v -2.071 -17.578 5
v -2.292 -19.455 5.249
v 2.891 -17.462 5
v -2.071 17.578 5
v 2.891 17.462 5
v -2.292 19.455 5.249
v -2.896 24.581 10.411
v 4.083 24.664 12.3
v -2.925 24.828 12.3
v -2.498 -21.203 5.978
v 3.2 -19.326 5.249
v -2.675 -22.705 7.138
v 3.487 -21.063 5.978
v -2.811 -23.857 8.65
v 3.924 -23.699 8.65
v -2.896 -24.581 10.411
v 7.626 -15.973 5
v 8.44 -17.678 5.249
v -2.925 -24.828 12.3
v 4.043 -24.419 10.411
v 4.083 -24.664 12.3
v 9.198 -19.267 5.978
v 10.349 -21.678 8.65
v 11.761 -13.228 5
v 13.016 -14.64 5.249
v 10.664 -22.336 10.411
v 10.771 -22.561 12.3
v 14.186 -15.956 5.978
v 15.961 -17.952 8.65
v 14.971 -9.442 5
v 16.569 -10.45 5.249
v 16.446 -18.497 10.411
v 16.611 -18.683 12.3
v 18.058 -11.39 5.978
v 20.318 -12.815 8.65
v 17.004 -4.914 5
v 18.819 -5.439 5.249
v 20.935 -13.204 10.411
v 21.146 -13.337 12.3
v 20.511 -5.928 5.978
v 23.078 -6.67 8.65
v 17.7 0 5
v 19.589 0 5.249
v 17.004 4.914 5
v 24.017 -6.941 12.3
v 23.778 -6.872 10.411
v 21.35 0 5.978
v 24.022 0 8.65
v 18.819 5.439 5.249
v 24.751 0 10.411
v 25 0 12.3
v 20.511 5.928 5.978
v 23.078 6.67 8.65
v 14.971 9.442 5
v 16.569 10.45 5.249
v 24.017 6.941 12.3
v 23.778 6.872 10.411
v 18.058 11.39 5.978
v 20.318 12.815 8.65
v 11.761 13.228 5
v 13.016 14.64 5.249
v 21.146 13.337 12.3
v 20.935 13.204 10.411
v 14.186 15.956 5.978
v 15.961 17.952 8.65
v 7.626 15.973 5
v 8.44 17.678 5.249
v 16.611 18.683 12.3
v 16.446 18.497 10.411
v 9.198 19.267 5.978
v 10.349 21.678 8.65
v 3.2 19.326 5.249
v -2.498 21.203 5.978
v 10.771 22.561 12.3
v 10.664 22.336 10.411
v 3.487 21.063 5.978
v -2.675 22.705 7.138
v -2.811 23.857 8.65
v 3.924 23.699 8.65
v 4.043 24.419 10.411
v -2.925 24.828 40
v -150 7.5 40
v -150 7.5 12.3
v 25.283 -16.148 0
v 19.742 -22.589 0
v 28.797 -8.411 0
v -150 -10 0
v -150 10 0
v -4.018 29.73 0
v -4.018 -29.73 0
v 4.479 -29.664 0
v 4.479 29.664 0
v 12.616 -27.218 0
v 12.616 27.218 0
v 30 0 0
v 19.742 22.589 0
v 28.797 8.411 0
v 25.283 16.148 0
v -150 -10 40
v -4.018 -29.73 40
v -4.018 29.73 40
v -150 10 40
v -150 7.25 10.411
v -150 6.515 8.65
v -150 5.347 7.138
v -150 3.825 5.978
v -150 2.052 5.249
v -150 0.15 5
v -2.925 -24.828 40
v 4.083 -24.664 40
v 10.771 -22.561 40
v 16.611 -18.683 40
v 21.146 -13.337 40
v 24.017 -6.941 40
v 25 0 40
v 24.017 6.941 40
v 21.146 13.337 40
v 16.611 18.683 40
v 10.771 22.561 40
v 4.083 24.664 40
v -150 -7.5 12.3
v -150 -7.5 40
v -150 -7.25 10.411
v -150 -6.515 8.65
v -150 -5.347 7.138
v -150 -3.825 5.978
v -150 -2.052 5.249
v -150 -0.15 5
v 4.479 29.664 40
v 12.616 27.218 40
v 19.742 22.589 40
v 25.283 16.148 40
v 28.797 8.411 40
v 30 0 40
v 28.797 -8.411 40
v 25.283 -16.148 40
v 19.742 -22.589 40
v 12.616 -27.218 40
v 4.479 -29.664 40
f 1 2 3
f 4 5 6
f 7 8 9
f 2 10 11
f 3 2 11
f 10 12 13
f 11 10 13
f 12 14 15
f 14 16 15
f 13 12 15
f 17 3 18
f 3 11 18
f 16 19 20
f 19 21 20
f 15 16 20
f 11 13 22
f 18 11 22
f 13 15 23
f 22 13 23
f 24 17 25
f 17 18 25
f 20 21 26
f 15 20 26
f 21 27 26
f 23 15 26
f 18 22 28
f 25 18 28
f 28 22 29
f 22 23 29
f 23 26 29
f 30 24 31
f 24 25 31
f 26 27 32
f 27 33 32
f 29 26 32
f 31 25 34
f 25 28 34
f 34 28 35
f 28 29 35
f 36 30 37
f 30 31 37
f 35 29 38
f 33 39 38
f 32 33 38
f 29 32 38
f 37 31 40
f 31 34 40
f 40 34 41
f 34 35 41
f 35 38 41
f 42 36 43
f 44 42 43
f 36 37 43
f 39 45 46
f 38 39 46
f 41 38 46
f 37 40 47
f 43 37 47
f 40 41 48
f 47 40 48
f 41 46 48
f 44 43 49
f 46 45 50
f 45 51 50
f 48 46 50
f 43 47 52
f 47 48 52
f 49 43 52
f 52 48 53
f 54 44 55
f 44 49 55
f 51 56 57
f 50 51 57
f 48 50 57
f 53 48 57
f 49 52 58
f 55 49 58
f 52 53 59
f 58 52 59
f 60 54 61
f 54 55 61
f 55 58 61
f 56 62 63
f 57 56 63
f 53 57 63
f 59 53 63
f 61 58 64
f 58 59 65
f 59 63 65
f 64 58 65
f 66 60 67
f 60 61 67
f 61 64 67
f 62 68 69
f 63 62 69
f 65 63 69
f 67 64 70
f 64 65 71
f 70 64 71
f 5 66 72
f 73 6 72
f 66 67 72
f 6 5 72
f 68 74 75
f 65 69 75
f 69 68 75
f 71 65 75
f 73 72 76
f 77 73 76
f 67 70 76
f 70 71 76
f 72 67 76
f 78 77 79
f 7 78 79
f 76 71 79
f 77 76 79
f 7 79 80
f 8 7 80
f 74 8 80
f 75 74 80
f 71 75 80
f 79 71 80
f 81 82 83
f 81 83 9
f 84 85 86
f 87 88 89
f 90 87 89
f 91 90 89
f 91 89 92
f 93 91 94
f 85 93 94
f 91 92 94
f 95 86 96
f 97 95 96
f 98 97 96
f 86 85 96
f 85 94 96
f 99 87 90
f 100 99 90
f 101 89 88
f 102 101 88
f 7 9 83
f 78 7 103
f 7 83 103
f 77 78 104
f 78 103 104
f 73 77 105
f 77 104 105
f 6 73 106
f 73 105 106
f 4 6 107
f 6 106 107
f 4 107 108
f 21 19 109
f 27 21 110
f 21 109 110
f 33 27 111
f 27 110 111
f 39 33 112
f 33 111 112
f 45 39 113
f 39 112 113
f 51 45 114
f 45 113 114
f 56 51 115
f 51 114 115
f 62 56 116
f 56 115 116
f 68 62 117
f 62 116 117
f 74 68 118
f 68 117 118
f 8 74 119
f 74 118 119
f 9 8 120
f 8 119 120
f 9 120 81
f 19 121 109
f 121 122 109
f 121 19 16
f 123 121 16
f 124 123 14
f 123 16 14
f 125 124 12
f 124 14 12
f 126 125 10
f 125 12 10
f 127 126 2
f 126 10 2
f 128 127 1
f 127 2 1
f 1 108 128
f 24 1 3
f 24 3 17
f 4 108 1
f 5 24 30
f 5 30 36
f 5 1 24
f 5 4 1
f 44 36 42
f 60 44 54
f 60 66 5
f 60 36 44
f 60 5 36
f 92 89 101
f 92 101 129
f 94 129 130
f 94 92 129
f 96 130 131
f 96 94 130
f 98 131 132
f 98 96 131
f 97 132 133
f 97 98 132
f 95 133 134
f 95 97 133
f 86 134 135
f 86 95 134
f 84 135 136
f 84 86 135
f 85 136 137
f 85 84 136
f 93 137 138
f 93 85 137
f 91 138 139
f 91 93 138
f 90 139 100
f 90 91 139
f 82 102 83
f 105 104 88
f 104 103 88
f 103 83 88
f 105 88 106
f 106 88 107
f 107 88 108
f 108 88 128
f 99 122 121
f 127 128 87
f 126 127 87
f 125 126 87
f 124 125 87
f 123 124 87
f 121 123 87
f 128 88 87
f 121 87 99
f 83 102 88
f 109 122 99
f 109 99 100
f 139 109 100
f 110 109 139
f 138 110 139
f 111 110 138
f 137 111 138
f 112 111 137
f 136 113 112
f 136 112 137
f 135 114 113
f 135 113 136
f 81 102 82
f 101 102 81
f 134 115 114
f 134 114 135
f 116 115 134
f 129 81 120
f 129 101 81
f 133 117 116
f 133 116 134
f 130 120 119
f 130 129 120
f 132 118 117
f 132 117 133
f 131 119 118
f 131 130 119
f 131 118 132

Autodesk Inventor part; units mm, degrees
ref_plane "YZ Plane" through (0, 0, 0) normal (1, 0, 0) x (0, 1, 0)
ref_plane "XZ Plane" through (0, 0, 0) normal (0, 1, 0) x (-1, 0, 0)
ref_plane "XY Plane" through (0, 0, 0) normal (0, 0, 1) x (1, 0, 0)
sketch "Skizze1" plane through (0, 0, 0) normal (0, 0, 1) x (1, 0, 0)
  arc A0 (-4.018, -29.7297) -> (-4.018, 29.7297) centre (0, 0) ccw
  line L0 (-4.018, 29.7297) -> (-150, 10)
  line L1 (-150, 10) -> (-150, -10)
  line L2 (-150, -10) -> (-4.018, -29.7297)
  line L3 (-186, 0) -> (66, 0) projected
  dimension "d0" = 60
  dimension "d1" = 150
  dimension "d2" = 20
extrude "Extrusion1" add sketch "Skizze1" along normal blind 40
sketch "Skizze2" plane through (0, 0, 40) normal (0, 0, 1) x (1, 0, 0)
  line L0 (-150, 10) -> (-150, -10) projected
  line L1 (-150, 7.5) -> (-2.9253, 24.8283)
  arc A0 (-2.9253, -24.8283) -> (-2.9253, 24.8283) centre (0, 0) ccw
  line L2 (-150, -7.5) -> (-2.9253, -24.8283)
  line L3 (-186, 0) -> (66, 0) projected
  dimension "d5" = 15
  dimension "d6" = 25
extrude "Extrusion2" cut sketch "Skizze2" against normal blind 35
fillet "Rundung1" radius 7.3 3 edges at (25, 0, 5) (-76.4626, -16.1641, 5) (-76.4626, 16.1641, 5)
properties part number "Weiche_1"
